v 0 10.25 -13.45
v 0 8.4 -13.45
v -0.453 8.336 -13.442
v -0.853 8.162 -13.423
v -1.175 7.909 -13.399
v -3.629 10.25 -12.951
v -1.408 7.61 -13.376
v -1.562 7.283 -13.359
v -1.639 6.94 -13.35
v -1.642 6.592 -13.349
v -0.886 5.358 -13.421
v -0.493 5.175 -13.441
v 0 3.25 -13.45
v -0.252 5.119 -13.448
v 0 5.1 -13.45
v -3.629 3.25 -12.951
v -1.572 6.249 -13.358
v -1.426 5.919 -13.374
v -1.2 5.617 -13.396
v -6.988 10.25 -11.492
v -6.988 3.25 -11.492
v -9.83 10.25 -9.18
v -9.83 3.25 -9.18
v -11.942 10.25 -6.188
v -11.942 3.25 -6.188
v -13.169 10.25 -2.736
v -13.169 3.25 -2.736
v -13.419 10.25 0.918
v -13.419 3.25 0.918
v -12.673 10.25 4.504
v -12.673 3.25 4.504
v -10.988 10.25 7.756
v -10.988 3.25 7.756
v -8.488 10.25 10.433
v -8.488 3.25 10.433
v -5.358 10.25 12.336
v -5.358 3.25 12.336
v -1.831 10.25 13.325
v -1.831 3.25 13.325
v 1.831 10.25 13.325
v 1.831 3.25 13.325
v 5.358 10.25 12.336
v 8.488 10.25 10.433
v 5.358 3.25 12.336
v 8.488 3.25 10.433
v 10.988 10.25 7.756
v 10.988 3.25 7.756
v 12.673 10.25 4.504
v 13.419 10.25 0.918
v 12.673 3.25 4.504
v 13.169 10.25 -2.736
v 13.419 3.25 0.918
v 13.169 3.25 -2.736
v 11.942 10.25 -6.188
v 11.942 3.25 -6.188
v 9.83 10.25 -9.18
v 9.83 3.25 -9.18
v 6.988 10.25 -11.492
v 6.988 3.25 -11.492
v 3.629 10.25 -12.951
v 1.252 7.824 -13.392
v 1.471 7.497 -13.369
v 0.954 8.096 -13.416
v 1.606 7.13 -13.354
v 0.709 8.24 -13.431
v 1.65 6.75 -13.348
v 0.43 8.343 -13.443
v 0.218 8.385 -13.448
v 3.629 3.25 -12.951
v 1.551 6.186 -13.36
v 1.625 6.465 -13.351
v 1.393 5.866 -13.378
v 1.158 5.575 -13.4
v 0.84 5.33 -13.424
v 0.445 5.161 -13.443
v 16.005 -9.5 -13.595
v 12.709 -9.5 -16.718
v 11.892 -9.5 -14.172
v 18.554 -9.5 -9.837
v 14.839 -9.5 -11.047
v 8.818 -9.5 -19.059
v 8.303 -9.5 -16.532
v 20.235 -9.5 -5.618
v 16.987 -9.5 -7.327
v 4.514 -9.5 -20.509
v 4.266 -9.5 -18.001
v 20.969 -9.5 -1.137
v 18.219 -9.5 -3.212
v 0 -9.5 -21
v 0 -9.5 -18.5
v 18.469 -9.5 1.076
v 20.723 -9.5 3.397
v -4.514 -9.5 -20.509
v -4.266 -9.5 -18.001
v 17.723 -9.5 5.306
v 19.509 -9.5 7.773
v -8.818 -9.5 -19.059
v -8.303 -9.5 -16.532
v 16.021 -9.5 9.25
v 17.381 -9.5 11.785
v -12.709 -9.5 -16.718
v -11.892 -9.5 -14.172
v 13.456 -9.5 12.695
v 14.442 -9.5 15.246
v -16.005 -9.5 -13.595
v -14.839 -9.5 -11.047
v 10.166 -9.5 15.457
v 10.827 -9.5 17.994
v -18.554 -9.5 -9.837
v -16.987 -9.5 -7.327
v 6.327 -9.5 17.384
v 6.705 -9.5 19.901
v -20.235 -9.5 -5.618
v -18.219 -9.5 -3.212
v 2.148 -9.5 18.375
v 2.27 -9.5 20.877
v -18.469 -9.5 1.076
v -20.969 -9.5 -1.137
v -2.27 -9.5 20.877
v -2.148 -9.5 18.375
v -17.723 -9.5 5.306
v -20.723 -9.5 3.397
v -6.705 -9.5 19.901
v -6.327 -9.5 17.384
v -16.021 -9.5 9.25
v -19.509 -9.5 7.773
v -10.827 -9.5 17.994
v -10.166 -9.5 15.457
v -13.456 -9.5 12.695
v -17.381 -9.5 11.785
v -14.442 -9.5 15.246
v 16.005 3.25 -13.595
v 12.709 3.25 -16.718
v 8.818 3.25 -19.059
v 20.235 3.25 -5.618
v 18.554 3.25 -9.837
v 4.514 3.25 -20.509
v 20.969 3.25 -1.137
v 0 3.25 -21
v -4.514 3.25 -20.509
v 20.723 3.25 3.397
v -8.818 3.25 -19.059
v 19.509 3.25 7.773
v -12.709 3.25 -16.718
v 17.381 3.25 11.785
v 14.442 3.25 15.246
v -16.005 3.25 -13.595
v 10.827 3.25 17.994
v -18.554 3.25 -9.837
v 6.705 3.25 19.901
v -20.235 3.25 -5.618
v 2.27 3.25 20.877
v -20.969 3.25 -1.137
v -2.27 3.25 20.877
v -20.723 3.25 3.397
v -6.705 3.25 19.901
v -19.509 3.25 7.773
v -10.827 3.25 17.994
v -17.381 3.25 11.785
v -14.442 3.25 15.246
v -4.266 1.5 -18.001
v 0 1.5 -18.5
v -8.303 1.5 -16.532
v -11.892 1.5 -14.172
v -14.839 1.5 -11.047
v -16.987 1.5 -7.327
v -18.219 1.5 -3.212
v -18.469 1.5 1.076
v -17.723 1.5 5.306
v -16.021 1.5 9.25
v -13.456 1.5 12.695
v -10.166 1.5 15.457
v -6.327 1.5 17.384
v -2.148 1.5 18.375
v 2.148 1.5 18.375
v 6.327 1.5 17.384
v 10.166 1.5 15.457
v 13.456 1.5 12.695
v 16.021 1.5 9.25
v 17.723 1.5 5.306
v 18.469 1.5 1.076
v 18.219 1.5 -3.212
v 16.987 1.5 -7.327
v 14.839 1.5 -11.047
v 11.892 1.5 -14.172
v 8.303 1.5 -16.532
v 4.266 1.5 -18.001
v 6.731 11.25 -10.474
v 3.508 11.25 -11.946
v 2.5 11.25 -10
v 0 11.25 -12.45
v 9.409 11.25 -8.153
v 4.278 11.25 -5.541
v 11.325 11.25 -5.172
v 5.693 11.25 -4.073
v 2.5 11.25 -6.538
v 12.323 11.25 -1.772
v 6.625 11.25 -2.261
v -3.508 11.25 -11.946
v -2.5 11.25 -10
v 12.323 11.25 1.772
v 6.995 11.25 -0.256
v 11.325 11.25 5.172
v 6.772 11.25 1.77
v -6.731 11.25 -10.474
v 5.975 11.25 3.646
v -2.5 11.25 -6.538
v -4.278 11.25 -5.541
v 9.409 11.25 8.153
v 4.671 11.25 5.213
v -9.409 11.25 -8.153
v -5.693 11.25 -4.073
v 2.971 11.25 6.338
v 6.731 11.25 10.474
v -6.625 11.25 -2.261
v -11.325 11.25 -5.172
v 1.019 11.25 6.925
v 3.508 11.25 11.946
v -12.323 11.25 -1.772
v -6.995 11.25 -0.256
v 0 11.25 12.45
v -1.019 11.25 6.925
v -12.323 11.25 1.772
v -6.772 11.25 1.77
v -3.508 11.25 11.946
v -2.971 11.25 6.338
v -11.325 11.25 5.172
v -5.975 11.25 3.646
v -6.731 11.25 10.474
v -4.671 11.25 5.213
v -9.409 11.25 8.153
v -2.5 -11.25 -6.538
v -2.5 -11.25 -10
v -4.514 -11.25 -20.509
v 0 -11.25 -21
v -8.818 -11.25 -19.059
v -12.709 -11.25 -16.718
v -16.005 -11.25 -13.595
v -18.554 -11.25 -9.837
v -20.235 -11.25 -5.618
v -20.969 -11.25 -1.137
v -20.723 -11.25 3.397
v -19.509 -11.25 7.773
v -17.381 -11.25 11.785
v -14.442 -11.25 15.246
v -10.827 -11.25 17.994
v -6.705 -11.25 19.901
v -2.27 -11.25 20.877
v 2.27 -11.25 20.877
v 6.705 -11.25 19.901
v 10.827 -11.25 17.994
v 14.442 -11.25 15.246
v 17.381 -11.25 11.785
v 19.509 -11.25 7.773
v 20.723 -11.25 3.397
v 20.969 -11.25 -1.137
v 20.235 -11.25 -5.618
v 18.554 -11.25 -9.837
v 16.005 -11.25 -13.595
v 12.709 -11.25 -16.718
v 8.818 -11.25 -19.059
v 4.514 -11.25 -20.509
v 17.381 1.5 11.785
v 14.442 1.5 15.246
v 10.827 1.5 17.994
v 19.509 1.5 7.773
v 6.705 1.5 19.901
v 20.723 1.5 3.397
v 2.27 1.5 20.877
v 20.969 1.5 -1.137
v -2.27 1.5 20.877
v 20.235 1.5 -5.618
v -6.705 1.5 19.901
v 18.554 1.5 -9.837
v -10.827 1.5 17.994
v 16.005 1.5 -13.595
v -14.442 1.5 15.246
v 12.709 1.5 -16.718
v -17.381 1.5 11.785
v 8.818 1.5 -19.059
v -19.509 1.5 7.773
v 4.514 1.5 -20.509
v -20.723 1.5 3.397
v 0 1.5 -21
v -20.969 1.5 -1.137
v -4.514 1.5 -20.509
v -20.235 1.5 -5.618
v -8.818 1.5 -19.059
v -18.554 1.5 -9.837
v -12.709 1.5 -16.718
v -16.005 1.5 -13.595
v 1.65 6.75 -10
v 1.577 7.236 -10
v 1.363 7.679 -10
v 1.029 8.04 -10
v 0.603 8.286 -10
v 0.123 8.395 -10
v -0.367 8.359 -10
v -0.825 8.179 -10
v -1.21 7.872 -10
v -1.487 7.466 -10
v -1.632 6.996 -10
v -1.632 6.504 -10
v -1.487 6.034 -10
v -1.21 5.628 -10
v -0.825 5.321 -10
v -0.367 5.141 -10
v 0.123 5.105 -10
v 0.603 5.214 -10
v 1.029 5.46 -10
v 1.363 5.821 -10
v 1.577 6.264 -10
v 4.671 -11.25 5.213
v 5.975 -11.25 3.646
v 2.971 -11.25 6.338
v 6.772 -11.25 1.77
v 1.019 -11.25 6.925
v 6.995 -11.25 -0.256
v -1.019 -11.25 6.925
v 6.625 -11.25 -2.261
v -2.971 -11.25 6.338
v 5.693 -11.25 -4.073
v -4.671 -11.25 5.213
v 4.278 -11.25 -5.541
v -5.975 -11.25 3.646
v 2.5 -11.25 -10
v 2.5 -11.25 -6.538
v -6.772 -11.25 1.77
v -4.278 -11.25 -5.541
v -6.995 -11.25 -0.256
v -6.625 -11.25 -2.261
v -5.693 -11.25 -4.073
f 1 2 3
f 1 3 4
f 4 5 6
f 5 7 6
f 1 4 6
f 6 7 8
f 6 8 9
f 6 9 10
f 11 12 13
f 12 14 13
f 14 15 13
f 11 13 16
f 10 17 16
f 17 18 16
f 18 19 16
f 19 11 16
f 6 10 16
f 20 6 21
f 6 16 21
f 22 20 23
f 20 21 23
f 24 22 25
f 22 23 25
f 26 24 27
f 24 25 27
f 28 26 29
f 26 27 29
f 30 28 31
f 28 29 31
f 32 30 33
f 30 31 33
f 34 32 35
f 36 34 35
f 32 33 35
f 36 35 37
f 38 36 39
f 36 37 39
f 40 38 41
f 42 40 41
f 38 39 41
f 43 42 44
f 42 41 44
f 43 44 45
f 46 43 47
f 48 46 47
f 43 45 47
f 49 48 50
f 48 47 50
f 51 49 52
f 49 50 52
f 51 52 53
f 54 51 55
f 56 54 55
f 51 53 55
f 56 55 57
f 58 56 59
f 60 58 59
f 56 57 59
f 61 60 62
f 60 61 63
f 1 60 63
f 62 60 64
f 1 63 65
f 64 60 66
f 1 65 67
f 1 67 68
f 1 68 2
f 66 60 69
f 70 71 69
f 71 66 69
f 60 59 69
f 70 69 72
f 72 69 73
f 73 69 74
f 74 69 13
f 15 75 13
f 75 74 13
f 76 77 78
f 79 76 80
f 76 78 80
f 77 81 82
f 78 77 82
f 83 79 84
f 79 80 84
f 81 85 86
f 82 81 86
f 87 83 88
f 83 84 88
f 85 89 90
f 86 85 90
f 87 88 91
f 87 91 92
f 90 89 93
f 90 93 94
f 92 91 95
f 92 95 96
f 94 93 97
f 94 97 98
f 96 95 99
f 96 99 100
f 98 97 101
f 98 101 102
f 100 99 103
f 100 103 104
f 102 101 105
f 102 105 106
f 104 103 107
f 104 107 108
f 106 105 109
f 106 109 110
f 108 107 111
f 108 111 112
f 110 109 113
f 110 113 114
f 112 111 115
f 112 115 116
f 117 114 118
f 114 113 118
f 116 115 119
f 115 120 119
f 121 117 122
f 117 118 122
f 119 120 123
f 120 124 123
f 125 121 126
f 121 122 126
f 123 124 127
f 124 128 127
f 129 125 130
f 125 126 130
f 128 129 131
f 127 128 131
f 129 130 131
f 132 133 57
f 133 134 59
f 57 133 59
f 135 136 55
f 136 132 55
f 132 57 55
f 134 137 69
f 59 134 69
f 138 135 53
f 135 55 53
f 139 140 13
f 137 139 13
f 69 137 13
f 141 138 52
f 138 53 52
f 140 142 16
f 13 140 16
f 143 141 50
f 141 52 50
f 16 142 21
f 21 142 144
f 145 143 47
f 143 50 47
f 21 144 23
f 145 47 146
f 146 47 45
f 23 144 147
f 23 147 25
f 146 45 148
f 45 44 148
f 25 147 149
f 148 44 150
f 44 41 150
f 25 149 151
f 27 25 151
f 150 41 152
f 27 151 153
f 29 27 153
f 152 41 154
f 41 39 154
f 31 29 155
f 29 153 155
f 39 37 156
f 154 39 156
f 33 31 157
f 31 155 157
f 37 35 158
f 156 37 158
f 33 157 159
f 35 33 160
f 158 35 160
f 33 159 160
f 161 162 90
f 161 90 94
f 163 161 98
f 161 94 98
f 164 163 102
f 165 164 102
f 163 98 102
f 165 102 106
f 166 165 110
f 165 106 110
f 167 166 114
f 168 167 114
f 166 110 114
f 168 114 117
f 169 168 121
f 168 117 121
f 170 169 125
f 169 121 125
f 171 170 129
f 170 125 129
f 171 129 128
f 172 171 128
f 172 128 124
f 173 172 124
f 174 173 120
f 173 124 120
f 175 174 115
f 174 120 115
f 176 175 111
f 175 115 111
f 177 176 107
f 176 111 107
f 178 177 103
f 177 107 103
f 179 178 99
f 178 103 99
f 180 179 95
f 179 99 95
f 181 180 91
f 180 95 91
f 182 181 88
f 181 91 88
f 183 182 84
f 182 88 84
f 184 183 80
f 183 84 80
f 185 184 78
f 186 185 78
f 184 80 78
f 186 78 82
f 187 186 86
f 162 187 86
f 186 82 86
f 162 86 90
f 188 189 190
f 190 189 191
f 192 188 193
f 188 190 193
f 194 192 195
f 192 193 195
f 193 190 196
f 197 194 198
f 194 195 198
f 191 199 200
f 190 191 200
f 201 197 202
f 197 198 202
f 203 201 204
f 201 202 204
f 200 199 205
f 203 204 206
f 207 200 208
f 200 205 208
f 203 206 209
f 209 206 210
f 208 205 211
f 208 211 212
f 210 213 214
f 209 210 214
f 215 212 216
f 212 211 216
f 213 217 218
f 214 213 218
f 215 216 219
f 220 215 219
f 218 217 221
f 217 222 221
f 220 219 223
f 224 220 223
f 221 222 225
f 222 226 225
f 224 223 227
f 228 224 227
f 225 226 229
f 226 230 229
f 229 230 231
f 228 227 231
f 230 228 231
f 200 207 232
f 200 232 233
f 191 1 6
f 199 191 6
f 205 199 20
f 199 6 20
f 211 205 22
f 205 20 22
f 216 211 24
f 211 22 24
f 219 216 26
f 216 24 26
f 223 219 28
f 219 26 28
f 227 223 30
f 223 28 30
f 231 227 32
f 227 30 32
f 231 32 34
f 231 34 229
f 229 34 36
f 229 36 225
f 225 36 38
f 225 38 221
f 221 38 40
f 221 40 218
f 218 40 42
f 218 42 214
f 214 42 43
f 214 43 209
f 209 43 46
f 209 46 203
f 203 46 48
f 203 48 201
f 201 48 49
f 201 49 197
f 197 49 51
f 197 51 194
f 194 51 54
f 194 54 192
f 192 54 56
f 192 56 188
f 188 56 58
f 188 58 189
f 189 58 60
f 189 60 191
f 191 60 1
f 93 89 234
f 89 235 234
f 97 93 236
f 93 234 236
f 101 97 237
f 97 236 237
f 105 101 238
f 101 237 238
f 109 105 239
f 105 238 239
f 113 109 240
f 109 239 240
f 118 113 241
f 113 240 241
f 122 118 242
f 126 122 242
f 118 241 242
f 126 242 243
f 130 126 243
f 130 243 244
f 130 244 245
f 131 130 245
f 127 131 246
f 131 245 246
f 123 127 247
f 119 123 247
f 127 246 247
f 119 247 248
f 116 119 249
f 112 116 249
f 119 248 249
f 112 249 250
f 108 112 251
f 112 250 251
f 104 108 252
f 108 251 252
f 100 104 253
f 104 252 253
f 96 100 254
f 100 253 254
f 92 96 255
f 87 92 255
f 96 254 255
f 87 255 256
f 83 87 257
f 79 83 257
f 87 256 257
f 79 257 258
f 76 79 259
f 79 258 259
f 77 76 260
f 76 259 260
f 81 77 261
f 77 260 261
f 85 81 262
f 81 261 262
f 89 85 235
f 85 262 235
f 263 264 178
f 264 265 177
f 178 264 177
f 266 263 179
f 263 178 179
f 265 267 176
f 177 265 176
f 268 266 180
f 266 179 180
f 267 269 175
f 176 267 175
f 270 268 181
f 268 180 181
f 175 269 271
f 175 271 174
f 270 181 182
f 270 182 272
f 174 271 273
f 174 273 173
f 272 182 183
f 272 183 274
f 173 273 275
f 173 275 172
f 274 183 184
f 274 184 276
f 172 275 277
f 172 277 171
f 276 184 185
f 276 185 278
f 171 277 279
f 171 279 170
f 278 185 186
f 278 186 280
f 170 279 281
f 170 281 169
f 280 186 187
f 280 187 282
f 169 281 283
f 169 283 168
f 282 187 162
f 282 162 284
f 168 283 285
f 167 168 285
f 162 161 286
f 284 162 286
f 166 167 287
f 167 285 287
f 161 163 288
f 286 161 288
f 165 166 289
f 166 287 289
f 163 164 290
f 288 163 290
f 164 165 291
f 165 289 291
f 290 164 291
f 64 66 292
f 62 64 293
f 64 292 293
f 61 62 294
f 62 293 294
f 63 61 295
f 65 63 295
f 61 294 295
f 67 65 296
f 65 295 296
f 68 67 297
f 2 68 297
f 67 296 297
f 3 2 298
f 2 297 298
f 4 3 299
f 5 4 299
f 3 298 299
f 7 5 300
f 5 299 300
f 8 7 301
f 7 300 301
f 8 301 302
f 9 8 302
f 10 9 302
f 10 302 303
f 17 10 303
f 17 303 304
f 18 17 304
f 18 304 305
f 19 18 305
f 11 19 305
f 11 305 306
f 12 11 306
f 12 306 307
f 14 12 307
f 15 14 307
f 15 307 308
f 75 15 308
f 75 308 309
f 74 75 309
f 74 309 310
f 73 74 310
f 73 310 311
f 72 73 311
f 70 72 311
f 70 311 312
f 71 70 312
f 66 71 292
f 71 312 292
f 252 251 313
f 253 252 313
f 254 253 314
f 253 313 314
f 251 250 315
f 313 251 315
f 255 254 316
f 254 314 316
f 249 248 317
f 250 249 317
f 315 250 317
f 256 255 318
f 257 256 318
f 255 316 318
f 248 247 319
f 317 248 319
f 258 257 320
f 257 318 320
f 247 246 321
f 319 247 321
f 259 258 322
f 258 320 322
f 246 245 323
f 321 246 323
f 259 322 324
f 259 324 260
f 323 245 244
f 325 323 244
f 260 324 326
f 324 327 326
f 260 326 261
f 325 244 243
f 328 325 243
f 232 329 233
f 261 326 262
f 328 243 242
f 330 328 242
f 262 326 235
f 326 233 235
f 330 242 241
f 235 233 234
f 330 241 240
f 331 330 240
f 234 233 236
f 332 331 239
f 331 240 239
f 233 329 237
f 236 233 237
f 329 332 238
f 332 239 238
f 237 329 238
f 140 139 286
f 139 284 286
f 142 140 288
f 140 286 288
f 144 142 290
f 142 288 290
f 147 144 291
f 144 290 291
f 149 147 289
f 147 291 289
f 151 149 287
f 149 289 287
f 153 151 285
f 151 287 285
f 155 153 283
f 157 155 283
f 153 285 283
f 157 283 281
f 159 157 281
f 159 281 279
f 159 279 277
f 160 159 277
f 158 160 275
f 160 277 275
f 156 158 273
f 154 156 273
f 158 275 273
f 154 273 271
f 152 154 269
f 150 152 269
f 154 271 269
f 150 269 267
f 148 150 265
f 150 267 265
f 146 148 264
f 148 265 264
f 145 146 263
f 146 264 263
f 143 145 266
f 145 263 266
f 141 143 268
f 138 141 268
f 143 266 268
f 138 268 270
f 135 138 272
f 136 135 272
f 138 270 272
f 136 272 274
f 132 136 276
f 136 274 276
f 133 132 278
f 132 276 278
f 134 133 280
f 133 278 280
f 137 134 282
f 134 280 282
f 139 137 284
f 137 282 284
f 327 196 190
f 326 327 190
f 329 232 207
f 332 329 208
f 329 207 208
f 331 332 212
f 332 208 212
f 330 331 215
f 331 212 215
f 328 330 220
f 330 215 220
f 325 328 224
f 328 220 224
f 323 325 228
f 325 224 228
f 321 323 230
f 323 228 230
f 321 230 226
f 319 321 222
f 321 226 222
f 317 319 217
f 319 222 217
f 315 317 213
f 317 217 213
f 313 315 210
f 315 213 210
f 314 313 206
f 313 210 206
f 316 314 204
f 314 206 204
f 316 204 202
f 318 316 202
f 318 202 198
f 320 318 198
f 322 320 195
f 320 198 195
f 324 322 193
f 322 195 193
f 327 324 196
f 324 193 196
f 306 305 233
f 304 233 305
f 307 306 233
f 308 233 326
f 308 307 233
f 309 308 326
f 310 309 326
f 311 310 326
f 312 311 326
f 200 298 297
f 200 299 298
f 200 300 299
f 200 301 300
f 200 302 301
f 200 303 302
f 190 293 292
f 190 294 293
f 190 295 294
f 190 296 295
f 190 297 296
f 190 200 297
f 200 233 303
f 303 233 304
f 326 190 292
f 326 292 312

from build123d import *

# Parameters (mm, degrees)
SMUSSO1_SIZE             = 1
SCHIZZO2_R               = 6
TAGLIO_ESTRUSIONE1_DEPTH = 38.259227045
SCHIZZO3_R               = 1.65
TAGLIO_ESTRUSIONE2_DEPTH = 32.75787304
SCHIZZO4_R               = 7
TAGLIO_ESTRUSIONE3_DEPTH = 38.259227106
SCHIZZO5_W               = 5
SCHIZZO5_H               = 6
TAGLIO_ESTRUSIONE4_DEPTH = 38.259227106


with BuildPart() as part:
    # Schizzo1 → Rivoluzione1 (revolve)
    with BuildSketch(Plane.XY, mode=Mode.PRIVATE) as rivoluzione1_sk:
        Polygon((0, 11.25), (13.45, 11.25), (13.45, 3.25), (21, 3.25), (21, 1.5), (18.5, 1.5), (18.5, -9.5), (21, -9.5), (21, -11.25), (0, -11.25), align=None)
    revolve(rivoluzione1_sk.sketch.rotate(Axis((0, -12.375, 0), (0, 1, 0)), 90), axis=Axis((0, -12.375, 0), (0, 1, 0)))

    # Smusso1
    smusso1_edges = [part.edges().sort_by_distance(p)[0] for p in [
        (0, 11.25, 13.45),
    ]]
    chamfer(smusso1_edges, length=SMUSSO1_SIZE)

    # Schizzo2 → Taglio-Estrusione1 (cut, through all)
    with BuildSketch(Plane(origin=(0, 11.25, 0), x_dir=(1, 0, 0), z_dir=(0, 1, 0))):
        with Locations(Location((0, 0, 0), (0, 0, 270))):
            Circle(SCHIZZO2_R)
    extrude(amount=-TAGLIO_ESTRUSIONE1_DEPTH, mode=Mode.SUBTRACT)

    # Schizzo3 → Taglio-Estrusione2 (cut, through all)
    with BuildSketch(Plane.XY):
        with Locations((0, 6.75)):
            Circle(SCHIZZO3_R)
    extrude(amount=-TAGLIO_ESTRUSIONE2_DEPTH, mode=Mode.SUBTRACT)

    # Schizzo4 → Taglio-Estrusione3 (cut, through all)
    with BuildSketch(Plane(origin=(0, 11.25, 0), x_dir=(1, 0, 0), z_dir=(0, 1, 0))):
        with Locations(Location((0, 0, 0), (0, 0, 270))):
            Circle(SCHIZZO4_R)
    extrude(amount=-TAGLIO_ESTRUSIONE3_DEPTH, mode=Mode.SUBTRACT)

    # Schizzo5 → Taglio-Estrusione4 (cut, through all)
    with BuildSketch(Plane(origin=(0, 11.25, 0), x_dir=(1, 0, 0), z_dir=(0, 1, 0))):
        with Locations((0, 7)):
            Rectangle(SCHIZZO5_W, SCHIZZO5_H)
    extrude(amount=-TAGLIO_ESTRUSIONE4_DEPTH, mode=Mode.SUBTRACT)


solid = part.part
